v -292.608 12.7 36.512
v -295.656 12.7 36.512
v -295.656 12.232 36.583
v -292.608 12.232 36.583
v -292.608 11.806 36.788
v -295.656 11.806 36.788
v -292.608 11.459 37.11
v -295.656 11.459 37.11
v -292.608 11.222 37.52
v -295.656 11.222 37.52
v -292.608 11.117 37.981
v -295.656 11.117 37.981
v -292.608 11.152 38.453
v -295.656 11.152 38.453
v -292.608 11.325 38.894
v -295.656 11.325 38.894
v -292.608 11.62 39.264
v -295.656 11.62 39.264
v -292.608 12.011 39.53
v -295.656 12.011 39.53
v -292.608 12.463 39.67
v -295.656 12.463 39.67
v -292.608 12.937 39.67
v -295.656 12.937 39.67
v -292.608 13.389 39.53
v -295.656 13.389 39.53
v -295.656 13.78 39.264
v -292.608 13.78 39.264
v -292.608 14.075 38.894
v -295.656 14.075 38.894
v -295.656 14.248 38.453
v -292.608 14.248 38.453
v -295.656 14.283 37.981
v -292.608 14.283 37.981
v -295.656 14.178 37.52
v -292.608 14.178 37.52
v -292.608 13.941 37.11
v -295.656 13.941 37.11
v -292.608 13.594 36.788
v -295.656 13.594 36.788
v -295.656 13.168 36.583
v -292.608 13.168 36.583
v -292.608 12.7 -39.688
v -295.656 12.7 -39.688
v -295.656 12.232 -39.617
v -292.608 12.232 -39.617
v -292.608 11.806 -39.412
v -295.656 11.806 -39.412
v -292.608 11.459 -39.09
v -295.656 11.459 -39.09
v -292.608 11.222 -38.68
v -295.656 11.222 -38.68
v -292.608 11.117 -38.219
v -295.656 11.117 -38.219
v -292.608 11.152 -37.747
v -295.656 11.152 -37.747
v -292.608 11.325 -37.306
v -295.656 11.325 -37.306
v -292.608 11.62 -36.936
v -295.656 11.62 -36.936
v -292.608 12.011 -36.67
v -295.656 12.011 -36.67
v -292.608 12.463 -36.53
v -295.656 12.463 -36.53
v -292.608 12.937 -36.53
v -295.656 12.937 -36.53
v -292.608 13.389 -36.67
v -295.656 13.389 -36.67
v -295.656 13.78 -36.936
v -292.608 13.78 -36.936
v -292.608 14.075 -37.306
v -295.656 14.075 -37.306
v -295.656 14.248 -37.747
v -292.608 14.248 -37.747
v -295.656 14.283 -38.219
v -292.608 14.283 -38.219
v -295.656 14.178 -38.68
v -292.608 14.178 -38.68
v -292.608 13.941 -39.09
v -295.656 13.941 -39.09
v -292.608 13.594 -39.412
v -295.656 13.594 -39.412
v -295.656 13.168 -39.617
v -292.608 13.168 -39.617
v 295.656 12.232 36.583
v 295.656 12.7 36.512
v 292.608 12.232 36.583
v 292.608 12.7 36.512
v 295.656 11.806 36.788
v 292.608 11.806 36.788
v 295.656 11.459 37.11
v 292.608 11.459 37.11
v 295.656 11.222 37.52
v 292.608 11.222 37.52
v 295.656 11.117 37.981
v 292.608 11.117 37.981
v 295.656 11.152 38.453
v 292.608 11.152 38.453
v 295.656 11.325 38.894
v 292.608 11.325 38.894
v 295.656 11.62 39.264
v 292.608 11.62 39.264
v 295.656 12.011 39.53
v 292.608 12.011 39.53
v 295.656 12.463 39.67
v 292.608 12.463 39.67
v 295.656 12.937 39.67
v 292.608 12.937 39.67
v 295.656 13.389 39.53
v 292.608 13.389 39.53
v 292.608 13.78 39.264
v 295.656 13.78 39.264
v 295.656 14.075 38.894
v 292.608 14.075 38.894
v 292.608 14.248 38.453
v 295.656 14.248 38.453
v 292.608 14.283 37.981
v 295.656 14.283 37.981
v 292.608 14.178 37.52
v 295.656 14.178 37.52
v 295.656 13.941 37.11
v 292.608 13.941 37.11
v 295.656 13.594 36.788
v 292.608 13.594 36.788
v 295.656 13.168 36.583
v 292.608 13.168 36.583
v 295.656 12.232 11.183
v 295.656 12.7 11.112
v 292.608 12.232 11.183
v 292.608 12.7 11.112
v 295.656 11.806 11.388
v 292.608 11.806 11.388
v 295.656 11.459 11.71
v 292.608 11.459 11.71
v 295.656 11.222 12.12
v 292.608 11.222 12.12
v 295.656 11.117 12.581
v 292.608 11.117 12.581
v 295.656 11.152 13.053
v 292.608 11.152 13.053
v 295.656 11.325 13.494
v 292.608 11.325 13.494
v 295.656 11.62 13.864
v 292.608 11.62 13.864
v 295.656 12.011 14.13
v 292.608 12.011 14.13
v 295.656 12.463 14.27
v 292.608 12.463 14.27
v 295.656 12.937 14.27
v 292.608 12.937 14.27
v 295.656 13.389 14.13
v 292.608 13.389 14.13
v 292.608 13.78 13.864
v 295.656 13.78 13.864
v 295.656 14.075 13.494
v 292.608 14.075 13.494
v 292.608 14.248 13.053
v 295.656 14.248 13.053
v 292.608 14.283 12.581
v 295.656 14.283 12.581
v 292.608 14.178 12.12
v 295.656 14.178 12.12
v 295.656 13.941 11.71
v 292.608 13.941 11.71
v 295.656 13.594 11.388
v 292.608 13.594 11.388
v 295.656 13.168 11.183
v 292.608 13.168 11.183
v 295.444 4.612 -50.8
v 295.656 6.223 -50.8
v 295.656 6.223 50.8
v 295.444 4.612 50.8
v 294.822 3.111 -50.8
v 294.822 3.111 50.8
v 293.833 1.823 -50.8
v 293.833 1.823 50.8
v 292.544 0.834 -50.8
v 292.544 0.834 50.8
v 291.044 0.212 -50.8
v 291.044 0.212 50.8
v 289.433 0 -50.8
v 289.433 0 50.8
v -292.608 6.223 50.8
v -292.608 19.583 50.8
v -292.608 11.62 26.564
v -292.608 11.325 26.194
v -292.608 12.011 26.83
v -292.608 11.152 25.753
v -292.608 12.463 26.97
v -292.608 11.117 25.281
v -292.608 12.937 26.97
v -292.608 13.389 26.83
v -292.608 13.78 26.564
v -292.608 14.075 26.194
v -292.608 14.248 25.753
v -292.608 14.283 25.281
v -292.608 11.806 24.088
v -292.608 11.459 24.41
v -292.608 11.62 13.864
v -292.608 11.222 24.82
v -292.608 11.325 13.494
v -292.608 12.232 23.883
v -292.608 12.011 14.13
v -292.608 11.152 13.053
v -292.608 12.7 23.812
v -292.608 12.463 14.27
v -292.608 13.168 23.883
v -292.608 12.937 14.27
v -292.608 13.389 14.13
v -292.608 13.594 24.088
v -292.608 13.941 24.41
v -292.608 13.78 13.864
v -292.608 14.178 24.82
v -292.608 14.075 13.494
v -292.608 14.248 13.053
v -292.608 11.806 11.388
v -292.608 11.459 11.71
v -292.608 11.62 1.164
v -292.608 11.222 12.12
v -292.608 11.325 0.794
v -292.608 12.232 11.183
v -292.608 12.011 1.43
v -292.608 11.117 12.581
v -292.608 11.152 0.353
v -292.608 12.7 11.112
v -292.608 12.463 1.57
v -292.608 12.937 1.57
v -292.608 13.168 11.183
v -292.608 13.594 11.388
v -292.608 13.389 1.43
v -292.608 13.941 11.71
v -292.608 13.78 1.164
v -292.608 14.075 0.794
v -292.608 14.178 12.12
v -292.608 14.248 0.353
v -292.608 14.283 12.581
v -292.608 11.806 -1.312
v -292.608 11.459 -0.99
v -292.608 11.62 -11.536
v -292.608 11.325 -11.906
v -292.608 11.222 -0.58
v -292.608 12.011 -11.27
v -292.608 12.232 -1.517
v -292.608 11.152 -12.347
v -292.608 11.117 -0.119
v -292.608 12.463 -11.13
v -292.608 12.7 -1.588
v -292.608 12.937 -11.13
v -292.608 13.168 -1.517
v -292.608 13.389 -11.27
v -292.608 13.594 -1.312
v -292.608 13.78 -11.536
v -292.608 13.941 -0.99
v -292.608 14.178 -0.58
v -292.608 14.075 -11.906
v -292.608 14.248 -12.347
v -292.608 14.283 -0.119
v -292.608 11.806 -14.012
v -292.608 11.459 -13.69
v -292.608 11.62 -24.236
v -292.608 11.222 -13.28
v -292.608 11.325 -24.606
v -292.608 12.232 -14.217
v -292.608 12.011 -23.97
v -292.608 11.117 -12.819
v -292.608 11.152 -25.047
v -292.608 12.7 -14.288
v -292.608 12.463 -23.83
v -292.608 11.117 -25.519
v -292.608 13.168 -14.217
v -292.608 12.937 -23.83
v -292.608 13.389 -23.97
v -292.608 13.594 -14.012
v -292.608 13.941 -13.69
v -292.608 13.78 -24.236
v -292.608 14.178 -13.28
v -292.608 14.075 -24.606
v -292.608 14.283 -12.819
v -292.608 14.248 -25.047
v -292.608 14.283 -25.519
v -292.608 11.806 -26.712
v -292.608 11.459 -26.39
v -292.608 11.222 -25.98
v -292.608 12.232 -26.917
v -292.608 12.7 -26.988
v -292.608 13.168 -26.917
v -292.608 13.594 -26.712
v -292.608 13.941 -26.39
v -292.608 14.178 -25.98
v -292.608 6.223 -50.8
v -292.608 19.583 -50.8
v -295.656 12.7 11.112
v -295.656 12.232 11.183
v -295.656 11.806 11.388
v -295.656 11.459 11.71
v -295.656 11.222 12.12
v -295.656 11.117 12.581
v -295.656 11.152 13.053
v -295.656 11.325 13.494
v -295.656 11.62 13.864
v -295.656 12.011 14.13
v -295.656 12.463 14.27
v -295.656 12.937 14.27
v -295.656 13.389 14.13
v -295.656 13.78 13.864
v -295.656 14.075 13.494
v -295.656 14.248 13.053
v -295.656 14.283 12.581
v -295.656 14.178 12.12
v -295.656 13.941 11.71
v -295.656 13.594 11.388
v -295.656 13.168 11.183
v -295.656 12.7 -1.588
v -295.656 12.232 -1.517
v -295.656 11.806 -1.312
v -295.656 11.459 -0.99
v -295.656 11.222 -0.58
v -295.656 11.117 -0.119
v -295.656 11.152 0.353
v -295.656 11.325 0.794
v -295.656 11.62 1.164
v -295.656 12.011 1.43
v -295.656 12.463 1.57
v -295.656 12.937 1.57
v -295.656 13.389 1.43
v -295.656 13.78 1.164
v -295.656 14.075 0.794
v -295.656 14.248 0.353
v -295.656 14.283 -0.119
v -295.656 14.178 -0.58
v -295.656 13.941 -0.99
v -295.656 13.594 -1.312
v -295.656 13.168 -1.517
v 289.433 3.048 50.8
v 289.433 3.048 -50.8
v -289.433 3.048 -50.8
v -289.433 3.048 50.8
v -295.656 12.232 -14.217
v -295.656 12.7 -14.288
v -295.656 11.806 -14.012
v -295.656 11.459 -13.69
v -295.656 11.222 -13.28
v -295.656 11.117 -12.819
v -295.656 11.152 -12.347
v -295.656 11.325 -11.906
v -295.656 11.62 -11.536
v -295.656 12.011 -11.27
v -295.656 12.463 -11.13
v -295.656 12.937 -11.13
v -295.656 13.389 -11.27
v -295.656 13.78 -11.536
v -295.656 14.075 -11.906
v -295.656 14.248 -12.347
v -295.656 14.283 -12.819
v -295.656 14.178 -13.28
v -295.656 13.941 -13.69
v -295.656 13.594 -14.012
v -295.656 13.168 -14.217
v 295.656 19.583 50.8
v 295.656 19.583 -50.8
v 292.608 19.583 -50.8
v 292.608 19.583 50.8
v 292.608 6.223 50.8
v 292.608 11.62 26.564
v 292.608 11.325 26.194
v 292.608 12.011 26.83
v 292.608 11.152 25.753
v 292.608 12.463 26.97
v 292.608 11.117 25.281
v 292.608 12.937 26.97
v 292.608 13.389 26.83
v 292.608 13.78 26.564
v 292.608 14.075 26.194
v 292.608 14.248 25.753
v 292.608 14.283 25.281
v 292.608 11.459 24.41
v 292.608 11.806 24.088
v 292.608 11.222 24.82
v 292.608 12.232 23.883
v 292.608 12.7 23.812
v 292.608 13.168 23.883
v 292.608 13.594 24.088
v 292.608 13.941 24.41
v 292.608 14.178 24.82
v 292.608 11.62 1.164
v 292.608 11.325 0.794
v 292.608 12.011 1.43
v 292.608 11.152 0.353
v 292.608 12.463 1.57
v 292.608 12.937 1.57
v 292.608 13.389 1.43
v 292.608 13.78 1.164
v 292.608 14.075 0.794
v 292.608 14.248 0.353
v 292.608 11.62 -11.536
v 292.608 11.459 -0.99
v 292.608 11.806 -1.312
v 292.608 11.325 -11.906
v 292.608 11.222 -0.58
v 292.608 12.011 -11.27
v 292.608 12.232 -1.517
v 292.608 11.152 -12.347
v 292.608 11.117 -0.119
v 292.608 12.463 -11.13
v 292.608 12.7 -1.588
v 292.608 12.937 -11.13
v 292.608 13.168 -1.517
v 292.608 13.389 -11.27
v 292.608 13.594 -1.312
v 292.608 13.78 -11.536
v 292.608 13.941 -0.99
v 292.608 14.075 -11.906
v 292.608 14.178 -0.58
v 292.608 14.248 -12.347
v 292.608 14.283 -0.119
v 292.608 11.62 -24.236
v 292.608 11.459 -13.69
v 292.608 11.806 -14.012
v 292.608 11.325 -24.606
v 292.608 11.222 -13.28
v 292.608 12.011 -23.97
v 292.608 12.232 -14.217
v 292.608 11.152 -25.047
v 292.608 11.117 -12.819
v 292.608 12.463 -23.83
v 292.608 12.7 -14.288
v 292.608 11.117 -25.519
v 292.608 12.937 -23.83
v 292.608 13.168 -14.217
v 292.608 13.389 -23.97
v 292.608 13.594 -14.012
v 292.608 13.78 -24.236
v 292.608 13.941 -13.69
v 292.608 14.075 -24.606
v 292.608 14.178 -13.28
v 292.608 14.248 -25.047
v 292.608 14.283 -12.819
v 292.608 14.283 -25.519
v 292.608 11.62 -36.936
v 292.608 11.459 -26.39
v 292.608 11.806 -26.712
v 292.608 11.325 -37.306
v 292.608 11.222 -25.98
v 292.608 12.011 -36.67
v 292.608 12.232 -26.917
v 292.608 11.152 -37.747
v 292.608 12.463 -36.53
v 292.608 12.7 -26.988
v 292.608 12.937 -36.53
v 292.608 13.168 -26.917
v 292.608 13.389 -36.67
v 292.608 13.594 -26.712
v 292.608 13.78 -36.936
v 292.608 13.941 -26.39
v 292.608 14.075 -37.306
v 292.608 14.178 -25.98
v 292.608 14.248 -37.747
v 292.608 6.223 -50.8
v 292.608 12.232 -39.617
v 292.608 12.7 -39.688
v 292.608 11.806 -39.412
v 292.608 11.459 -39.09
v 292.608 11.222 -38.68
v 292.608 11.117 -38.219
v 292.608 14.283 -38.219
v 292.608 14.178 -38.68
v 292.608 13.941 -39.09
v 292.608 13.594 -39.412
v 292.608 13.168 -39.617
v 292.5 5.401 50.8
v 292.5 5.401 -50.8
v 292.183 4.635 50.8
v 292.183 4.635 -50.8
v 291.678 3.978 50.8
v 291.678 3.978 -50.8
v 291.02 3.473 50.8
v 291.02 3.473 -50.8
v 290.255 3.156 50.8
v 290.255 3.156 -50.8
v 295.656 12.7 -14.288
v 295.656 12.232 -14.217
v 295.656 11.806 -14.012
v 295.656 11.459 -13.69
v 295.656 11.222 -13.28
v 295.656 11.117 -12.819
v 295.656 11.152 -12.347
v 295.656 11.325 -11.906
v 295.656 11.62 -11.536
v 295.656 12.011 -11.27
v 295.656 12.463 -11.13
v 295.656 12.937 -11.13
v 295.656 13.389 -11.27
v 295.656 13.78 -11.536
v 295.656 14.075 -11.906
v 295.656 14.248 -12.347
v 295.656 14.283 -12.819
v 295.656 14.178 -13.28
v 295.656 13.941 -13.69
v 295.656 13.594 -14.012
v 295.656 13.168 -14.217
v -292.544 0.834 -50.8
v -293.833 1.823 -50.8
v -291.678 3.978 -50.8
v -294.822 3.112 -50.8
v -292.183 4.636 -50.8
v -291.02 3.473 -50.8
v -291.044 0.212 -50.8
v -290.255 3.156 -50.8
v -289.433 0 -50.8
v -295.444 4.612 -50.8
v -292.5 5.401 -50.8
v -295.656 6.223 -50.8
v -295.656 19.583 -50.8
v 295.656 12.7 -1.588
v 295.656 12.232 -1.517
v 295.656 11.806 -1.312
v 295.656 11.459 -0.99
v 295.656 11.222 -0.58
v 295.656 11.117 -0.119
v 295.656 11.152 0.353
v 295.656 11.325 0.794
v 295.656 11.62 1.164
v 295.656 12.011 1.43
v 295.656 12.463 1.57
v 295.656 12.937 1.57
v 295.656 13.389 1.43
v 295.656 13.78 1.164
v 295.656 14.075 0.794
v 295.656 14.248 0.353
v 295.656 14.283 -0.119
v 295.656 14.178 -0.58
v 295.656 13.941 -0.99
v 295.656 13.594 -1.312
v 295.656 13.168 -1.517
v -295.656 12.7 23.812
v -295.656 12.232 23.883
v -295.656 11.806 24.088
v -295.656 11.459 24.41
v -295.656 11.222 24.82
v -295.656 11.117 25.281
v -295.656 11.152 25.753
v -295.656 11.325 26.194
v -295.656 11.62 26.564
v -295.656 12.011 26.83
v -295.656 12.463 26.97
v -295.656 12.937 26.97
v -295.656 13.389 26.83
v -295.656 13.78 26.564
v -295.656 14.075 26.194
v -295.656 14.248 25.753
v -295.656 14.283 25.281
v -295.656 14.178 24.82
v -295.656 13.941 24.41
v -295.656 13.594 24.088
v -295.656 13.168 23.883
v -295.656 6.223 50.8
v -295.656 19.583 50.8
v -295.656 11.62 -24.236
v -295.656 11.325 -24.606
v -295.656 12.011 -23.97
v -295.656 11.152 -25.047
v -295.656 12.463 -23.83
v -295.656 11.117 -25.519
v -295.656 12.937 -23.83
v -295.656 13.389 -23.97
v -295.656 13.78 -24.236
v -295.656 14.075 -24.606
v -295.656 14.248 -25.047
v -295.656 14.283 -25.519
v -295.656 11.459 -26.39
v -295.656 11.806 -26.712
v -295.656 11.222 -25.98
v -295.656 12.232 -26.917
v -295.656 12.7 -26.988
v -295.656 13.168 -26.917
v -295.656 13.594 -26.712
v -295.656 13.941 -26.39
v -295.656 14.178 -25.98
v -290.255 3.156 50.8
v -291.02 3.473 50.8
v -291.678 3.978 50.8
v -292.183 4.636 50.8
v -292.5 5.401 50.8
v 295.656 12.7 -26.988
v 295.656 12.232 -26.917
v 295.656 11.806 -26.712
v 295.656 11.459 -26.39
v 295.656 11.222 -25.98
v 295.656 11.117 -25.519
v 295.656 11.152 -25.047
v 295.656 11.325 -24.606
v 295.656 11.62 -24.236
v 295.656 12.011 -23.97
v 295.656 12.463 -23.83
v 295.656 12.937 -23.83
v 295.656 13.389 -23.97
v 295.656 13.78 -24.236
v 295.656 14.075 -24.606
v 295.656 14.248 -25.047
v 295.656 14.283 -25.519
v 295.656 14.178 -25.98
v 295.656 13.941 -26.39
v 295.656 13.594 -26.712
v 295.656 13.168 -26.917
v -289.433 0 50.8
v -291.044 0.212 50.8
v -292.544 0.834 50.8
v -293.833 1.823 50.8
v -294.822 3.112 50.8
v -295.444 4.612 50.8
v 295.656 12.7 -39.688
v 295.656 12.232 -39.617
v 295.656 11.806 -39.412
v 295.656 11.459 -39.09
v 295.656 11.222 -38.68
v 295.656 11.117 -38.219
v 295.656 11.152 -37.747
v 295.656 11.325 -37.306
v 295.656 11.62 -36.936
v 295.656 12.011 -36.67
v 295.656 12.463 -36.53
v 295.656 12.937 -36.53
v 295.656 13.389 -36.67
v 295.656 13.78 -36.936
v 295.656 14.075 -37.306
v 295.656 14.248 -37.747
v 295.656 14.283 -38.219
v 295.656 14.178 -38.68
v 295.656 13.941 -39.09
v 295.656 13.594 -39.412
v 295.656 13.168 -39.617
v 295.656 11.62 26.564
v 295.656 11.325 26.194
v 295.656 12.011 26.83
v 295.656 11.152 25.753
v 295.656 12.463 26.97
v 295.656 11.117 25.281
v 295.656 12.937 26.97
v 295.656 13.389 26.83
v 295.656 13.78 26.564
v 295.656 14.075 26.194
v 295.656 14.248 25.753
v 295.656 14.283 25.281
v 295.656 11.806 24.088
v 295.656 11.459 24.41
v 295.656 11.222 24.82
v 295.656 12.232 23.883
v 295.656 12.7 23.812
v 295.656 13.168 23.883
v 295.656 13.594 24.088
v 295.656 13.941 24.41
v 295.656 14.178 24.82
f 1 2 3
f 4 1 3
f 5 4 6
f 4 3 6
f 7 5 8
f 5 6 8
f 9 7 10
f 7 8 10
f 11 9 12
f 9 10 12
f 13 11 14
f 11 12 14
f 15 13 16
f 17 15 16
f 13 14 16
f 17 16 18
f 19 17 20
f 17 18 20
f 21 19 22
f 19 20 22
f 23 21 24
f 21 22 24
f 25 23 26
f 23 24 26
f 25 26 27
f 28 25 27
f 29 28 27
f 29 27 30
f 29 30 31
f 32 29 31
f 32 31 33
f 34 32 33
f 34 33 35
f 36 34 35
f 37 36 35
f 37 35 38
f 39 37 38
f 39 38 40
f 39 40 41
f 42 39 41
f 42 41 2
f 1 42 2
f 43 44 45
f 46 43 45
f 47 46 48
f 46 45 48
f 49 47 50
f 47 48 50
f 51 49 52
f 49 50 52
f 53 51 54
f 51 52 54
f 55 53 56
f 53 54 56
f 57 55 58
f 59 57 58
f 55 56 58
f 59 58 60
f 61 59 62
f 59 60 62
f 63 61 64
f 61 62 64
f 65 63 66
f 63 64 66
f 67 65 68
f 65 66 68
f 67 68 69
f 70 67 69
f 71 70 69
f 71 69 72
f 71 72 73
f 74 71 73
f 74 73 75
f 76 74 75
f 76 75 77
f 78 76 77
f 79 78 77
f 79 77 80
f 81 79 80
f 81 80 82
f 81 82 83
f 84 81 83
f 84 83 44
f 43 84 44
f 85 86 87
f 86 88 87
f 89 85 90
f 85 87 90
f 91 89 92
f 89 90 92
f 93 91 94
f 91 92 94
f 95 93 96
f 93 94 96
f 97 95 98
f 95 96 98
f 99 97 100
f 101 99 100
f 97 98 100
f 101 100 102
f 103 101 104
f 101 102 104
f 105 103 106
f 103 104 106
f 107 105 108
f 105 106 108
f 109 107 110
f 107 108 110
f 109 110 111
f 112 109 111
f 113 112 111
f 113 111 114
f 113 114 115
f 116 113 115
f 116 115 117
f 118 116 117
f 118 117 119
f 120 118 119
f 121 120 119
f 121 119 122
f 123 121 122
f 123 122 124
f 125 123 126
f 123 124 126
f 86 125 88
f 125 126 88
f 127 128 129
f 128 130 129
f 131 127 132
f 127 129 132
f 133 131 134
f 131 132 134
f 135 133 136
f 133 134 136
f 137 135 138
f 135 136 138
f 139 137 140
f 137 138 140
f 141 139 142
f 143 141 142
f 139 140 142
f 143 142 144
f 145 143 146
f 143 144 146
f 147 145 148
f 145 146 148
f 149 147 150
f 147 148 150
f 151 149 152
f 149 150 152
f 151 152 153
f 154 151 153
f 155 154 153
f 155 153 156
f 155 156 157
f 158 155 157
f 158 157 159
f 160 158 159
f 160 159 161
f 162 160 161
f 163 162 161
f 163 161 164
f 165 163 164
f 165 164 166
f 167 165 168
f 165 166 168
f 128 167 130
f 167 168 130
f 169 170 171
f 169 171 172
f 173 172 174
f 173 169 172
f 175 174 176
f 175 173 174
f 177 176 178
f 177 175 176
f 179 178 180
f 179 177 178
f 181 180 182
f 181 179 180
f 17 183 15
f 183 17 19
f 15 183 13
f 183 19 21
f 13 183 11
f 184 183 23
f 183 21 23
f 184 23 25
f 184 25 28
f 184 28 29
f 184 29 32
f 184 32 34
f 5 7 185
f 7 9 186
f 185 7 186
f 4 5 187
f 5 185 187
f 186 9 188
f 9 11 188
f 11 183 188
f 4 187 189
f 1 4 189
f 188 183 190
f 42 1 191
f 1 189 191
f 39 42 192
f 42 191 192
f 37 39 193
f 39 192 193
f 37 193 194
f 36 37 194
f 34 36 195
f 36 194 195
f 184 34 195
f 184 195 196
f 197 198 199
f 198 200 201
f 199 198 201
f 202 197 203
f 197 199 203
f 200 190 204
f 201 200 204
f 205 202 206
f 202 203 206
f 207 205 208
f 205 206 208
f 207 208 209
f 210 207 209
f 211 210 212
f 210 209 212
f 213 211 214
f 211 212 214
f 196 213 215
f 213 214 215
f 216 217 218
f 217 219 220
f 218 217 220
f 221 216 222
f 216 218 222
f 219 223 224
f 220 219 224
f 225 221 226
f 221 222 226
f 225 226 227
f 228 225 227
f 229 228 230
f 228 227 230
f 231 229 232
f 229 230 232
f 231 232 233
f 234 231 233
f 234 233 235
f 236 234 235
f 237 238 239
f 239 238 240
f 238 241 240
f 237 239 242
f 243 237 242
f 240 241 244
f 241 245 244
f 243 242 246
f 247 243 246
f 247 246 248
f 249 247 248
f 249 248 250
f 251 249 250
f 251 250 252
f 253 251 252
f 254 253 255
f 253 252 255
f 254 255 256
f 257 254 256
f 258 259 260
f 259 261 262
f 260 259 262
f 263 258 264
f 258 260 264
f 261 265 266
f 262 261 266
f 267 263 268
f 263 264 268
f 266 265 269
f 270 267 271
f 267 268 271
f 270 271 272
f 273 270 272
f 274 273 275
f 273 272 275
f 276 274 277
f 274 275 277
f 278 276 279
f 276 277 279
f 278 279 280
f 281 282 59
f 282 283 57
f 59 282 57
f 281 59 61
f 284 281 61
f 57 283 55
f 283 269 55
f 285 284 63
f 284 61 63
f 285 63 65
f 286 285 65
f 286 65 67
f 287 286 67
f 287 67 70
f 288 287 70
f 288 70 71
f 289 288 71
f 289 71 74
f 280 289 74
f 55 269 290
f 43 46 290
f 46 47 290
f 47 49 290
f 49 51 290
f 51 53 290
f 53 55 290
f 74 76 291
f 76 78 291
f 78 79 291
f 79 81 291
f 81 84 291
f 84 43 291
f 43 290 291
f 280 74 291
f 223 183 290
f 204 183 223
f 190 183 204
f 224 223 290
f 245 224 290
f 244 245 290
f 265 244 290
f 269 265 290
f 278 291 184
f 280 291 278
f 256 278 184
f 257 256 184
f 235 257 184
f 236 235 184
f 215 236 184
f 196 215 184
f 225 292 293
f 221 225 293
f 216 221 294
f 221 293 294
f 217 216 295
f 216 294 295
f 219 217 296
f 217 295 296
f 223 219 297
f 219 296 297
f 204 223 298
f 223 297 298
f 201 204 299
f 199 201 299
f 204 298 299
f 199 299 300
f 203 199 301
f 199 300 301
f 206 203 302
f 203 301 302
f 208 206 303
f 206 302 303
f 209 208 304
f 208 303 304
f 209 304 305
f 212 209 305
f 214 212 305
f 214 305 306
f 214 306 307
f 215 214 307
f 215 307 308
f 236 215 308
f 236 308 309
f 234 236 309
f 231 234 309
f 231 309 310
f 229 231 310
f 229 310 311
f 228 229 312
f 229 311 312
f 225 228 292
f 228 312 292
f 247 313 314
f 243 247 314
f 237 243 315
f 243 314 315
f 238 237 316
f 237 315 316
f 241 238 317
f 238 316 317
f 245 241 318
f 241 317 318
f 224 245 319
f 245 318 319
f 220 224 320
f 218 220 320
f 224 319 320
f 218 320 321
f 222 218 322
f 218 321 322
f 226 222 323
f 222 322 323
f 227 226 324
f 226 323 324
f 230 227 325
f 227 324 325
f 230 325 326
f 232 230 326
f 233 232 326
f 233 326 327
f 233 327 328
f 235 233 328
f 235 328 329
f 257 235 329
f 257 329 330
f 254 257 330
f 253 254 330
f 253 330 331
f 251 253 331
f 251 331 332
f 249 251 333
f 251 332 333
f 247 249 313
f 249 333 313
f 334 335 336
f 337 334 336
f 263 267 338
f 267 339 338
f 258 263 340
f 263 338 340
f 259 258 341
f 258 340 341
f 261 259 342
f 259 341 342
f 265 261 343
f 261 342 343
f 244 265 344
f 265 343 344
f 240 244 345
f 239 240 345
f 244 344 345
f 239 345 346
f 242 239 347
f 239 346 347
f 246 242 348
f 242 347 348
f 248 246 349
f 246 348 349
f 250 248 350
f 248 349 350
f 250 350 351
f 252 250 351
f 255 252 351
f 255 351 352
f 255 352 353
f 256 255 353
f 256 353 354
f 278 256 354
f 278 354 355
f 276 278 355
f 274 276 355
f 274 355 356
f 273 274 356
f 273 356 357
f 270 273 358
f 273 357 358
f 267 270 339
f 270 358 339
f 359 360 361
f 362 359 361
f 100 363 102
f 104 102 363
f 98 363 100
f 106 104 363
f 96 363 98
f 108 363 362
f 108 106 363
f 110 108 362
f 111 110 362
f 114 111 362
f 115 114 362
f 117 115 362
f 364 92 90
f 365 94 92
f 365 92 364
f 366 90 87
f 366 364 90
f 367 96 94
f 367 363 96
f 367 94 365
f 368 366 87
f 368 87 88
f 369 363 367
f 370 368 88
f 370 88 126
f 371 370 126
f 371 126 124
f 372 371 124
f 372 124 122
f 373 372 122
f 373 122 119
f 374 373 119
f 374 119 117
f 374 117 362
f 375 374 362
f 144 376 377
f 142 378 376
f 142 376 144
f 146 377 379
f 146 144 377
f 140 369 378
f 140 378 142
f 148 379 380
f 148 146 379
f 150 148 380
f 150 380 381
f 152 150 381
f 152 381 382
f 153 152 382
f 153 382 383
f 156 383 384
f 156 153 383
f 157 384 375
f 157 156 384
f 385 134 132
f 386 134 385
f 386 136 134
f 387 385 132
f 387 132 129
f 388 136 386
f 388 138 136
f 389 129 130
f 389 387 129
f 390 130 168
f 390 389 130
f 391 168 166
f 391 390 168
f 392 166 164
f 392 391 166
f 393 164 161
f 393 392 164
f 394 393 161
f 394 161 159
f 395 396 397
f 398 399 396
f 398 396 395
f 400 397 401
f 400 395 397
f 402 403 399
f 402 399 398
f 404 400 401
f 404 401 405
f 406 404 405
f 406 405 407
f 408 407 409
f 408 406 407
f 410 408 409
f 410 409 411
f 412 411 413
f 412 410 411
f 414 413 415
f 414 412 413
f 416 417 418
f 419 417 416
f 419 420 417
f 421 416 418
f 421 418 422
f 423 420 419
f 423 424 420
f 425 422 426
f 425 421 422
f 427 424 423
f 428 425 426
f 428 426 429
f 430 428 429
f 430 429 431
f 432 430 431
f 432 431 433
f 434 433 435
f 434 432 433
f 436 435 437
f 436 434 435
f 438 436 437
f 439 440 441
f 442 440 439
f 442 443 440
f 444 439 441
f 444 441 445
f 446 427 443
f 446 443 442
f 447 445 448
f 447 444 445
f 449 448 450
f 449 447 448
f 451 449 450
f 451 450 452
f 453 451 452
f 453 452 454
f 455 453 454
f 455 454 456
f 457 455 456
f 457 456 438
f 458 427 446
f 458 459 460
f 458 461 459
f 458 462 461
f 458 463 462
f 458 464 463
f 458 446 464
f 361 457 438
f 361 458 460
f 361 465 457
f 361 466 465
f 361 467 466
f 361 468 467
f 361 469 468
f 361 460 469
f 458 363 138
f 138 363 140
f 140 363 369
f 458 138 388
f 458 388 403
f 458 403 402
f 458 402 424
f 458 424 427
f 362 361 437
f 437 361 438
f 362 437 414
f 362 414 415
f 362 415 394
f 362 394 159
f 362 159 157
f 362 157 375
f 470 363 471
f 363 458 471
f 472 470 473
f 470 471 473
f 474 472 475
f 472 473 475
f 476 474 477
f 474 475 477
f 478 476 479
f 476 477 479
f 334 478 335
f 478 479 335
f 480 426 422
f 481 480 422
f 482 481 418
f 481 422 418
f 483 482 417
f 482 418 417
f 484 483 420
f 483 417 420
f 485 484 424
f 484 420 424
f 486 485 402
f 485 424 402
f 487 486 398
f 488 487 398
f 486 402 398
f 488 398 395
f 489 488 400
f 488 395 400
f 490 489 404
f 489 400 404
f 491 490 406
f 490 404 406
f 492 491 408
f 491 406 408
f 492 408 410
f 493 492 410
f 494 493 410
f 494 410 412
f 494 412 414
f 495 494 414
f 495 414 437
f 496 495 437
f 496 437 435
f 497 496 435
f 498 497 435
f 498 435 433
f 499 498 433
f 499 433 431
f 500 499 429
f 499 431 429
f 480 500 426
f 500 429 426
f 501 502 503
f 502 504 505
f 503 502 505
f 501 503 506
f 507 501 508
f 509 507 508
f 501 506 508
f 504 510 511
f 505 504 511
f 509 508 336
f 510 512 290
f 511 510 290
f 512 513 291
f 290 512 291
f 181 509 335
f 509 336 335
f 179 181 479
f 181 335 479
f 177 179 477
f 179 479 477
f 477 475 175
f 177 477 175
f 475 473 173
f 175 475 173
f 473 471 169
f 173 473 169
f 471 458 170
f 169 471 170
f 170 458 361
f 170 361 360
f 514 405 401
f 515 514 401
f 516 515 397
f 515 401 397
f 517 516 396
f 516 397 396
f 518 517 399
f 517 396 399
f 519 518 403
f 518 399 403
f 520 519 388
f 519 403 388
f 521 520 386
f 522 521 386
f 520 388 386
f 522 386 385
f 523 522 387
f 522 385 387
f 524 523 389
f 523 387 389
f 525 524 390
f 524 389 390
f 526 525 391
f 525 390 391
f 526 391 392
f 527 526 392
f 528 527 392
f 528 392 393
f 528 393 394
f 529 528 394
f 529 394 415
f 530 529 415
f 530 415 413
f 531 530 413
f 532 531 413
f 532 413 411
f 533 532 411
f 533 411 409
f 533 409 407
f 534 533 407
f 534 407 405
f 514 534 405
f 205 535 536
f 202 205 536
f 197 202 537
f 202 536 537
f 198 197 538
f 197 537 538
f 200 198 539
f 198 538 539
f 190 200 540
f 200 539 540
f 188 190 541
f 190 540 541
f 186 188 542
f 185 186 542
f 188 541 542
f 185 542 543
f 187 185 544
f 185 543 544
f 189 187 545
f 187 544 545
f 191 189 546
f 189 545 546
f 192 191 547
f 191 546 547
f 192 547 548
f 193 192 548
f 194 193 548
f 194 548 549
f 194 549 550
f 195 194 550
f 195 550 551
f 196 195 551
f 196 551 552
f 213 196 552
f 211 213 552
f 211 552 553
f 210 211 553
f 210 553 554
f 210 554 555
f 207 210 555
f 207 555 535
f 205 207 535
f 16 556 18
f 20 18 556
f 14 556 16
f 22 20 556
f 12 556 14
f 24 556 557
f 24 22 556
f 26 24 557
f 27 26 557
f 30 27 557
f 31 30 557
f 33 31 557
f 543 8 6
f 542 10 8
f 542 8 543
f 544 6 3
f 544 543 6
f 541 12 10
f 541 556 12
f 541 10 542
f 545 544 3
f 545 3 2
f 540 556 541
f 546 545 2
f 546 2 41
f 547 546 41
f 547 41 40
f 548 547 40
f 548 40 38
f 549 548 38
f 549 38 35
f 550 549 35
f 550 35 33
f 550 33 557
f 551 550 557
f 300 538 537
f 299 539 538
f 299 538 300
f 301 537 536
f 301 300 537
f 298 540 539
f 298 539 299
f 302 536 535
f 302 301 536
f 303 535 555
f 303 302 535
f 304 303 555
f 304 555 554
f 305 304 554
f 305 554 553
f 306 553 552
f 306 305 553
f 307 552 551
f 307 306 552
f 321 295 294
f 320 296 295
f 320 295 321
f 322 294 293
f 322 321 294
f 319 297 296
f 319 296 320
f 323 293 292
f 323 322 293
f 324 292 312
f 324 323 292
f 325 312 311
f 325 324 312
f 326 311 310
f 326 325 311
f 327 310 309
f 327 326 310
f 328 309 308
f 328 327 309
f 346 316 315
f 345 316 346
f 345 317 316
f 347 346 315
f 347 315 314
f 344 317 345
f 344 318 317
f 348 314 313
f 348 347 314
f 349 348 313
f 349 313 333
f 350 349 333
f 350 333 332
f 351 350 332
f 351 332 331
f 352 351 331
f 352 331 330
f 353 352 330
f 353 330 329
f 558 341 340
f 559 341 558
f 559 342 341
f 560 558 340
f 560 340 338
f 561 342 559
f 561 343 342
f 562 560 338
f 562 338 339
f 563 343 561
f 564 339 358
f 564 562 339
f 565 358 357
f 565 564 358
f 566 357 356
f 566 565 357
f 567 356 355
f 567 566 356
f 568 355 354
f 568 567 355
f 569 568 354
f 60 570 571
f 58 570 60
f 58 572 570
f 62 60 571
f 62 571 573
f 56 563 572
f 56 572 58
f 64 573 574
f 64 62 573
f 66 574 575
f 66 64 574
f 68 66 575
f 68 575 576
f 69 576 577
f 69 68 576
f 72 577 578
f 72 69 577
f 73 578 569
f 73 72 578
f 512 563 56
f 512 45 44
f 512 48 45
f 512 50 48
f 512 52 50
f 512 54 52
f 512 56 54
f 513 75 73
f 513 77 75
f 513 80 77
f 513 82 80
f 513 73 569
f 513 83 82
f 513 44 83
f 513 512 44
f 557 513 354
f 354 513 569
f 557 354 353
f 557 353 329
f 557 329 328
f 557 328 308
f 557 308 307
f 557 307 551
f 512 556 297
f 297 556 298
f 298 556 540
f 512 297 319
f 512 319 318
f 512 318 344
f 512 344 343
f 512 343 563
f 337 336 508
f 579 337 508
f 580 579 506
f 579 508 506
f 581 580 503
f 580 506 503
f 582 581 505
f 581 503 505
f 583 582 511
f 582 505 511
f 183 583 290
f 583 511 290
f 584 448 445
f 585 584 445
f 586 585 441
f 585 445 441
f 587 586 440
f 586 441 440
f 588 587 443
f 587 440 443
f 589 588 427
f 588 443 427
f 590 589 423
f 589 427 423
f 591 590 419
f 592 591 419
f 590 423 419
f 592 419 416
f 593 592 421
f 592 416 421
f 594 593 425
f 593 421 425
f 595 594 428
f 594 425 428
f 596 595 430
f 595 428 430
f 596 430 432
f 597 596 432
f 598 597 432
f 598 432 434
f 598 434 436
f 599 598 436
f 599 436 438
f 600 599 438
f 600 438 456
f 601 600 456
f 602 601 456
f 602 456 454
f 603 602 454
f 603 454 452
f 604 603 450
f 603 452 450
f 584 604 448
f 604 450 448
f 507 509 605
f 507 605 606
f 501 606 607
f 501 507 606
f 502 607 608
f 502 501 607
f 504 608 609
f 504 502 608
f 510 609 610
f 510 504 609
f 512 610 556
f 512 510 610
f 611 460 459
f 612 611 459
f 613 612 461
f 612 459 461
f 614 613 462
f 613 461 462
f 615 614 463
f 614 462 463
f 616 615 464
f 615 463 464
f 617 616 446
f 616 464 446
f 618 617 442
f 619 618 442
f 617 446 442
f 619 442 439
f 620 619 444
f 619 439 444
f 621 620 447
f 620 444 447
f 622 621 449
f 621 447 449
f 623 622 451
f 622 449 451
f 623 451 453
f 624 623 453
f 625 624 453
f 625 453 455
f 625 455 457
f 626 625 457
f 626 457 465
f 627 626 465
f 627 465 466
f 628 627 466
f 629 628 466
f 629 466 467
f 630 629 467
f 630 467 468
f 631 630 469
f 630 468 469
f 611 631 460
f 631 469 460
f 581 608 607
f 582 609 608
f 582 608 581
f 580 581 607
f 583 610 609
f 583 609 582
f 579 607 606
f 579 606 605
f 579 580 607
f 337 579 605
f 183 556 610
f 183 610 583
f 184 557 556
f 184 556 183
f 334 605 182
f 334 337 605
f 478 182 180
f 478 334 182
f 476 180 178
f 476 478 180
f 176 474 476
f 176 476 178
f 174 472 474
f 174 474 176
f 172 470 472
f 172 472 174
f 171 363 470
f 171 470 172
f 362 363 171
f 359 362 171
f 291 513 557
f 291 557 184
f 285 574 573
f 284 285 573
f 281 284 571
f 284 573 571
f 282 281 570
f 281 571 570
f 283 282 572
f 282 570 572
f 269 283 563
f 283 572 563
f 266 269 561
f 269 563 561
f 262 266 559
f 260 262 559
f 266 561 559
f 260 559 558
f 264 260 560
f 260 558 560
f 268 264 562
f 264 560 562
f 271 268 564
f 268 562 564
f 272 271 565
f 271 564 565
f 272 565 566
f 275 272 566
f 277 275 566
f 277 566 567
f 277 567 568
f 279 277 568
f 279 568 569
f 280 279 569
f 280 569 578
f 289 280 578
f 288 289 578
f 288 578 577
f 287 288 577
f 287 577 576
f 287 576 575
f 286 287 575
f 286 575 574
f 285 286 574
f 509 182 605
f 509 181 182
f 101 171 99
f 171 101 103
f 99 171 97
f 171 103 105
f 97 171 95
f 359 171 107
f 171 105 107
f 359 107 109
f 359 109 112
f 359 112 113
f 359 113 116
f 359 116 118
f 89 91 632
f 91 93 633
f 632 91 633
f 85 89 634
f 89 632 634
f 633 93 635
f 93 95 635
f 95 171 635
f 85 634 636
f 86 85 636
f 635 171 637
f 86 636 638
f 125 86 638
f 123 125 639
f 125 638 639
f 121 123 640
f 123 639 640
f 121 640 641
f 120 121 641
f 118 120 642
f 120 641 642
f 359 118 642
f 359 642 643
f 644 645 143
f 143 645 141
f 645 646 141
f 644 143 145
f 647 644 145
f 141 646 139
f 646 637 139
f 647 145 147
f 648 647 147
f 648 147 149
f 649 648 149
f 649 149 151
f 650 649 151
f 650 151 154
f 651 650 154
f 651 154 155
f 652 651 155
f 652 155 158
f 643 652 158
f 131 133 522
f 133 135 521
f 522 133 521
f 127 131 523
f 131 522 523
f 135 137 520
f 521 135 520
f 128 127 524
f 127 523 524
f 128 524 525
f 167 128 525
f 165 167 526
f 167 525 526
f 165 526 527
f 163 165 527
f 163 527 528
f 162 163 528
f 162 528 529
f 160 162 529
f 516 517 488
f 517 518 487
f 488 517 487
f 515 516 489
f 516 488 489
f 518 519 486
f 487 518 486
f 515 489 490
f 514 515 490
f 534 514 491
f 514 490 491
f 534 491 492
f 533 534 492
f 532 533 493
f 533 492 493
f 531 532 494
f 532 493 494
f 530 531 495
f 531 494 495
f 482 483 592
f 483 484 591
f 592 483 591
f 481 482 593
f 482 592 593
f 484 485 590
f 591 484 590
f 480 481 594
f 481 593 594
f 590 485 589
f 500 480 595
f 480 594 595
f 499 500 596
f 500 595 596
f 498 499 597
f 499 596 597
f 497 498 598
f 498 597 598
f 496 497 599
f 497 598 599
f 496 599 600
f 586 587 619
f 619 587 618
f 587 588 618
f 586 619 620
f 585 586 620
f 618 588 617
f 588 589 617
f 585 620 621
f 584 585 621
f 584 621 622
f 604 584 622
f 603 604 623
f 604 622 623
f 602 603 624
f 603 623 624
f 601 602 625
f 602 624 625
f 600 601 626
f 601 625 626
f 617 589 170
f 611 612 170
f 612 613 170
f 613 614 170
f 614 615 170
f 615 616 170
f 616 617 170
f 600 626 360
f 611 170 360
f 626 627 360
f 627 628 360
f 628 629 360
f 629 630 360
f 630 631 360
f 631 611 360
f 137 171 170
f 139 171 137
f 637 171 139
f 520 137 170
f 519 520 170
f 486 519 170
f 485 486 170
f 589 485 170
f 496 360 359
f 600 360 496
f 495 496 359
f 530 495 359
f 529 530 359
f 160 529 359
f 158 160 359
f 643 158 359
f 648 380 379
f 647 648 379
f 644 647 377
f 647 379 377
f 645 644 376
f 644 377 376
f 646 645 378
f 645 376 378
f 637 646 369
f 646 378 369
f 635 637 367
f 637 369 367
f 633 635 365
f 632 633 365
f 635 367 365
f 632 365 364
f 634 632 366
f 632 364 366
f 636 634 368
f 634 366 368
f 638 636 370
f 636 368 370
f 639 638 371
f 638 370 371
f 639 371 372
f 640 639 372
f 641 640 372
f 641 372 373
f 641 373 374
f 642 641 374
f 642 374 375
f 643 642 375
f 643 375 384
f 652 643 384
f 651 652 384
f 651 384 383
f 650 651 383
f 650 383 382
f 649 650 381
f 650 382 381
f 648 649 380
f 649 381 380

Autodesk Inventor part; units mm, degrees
ref_plane "YZ Plane" through (0, 0, 0) normal (1, 0, 0) x (0, 1, 0)
ref_plane "XZ Plane" through (0, 0, 0) normal (0, 1, 0) x (-1, 0, 0)
ref_plane "XY Plane" through (0, 0, 0) normal (0, 0, 1) x (1, 0, 0)
sketch "Sketch2" plane through (0, 0, 0) normal (0, 1, 0) x (-1, 0, 0)
  line L0 (-289.433, 50.8) -> (289.433, 50.8)
  line L1 (289.433, 50.8) -> (289.433, -50.8)
  line L2 (289.433, -50.8) -> (-289.433, -50.8)
  line L3 (-289.433, -50.8) -> (-289.433, 50.8)
  point P0 (0, 0)
  dimension "d0" = 289.433
  dimension "d1" = 289.433
  dimension "d2" = 50.8
  dimension "d3" = 50.8
extrude "Plate1" add sketch "Sketch2" along normal blind 3.048
sketch "Sketch3" plane through (-289.433, 0, 50.8) normal (0, 0, 1) x (1, 0, 0)
  arc A0 (578.866, 0) -> (585.089, 6.223) centre (578.866, 6.223) ccw
  line L0 (578.866, 6.223) -> (585.089, 6.223) construction
  line L1 (578.866, 6.223) -> (578.866, 0) construction
  line L2 (585.089, 6.223) -> (585.089, 19.5834)
  point P0 (578.866, 3.048)
  point P1 (289.433, 0)
  dimension "d5" = 90
  dimension "d6" = 6.223
  dimension "d7" = 6.223
  dimension "d8" = 13.3604
contour flange "Contour Flange1" sketch "Sketch3" thickness 3.048 bend radius 3.048 curves A0 L2 edges at (289.433, 0, 0) running between points at (289.433, 0, -50.8) (289.433, 0, 50.8)
bend "Bend1"
corner "Corner1"
sketch "Sketch4" plane through (-289.433, 0, 50.8) normal (0, 0, 1) x (1, 0, 0)
  arc A0 (-6.223, 6.223) -> (0, 0) centre (0, 6.223) ccw
  line L0 (0, 6.223) -> (-6.223, 6.223) construction
  line L1 (0, 6.223) -> (0, 0) construction
  line L2 (-6.223, 6.223) -> (-6.223, 19.5834)
  point P0 (0, 3.048)
  point P1 (289.433, 0)
  dimension "d18" = 90
  dimension "d19" = 6.223
  dimension "d20" = 6.223
  dimension "d21" = 13.3604
contour flange "Contour Flange2" sketch "Sketch4" thickness 3.048 bend radius 3.048 curves A0 L2 edges at (-289.433, 0, 0) running between points at (-289.433, 0, 50.8) (-289.433, 0, -50.8)
bend "Bend2"
corner "Corner2"
sketch "Sketch5" plane through (295.656, 6.223, -50.8) normal (1, 0, 0) x (0, 0, -1)
  line L0 (-101.6, 0) -> (-101.6, 13.3604) projected
  line L1 (0, -6.223) -> (-101.6, -6.223) projected
  point P0 (-50.8, -6.223)
  point P1 (-88.9, 6.477)
  dimension "d31" = 12.7
  dimension "d32" = 12.7
hole "Hole1" at (295.656, 12.7, 38.1) direction (-1, 0, 0) diameter 3.175 end through all
sketch "Sketch6" plane through (295.656, 6.223, -50.8) normal (1, 0, 0) x (0, 0, -1)
  circle A0 centre (-88.9, 6.477) radius 1.5875 projected
  line L0 (-101.6, 0) -> (-101.6, 13.3604) projected
  line L1 (-88.9, 6.477) -> (-74.5256, 6.477)
  point P0 (-50.8, -6.223)
pattern_linear "Rectangular Pattern1" count 7 spacing 12.7 along (0, 0, -1) of "Hole1"
equation "\"d38\" = Thickness"
equation "\"d9\" = BendReliefWidth"
equation "\"d10\" = BendReliefDepth"
equation "\"d11\" = MinimumRemnant"
equation "\"d12\" = BendRadius"
equation "\"d13\" = BendRadius"
equation "\"d15\" = CornerReliefSize"
equation "\"d16\" = GapSize"
equation "\"d17\" = JacobiRadiusSize"
equation "\"d22\" = BendReliefWidth"
equation "\"d23\" = BendReliefDepth"
equation "\"d24\" = MinimumRemnant"
equation "\"d25\" = BendRadius"
equation "\"d26\" = BendRadius"
equation "\"d28\" = CornerReliefSize"
equation "\"d29\" = GapSize"
equation "\"d30\" = JacobiRadiusSize"
equation "\"d1\" = d0"
equation "\"d3\" = d2"
equation "\"BendRadius\" = Thickness"
equation "\"BendReliefWidth\" = Thickness"
equation "\"BendReliefDepth\" = 0.5 * Thickness"
equation "\"CornerReliefSize\" = 4 * Thickness"
equation "\"MinimumRemnant\" = 2 * Thickness"
equation "\"TransitionRadius\" = BendRadius"
equation "\"JacobiRadiusSize\" = BendRadius"
equation "\"GapSize\" = Thickness"
equation "\"d4\" = BendRadius"
equation "\"Thickness\" = 3.048"
properties part number "Base Crossbar"
